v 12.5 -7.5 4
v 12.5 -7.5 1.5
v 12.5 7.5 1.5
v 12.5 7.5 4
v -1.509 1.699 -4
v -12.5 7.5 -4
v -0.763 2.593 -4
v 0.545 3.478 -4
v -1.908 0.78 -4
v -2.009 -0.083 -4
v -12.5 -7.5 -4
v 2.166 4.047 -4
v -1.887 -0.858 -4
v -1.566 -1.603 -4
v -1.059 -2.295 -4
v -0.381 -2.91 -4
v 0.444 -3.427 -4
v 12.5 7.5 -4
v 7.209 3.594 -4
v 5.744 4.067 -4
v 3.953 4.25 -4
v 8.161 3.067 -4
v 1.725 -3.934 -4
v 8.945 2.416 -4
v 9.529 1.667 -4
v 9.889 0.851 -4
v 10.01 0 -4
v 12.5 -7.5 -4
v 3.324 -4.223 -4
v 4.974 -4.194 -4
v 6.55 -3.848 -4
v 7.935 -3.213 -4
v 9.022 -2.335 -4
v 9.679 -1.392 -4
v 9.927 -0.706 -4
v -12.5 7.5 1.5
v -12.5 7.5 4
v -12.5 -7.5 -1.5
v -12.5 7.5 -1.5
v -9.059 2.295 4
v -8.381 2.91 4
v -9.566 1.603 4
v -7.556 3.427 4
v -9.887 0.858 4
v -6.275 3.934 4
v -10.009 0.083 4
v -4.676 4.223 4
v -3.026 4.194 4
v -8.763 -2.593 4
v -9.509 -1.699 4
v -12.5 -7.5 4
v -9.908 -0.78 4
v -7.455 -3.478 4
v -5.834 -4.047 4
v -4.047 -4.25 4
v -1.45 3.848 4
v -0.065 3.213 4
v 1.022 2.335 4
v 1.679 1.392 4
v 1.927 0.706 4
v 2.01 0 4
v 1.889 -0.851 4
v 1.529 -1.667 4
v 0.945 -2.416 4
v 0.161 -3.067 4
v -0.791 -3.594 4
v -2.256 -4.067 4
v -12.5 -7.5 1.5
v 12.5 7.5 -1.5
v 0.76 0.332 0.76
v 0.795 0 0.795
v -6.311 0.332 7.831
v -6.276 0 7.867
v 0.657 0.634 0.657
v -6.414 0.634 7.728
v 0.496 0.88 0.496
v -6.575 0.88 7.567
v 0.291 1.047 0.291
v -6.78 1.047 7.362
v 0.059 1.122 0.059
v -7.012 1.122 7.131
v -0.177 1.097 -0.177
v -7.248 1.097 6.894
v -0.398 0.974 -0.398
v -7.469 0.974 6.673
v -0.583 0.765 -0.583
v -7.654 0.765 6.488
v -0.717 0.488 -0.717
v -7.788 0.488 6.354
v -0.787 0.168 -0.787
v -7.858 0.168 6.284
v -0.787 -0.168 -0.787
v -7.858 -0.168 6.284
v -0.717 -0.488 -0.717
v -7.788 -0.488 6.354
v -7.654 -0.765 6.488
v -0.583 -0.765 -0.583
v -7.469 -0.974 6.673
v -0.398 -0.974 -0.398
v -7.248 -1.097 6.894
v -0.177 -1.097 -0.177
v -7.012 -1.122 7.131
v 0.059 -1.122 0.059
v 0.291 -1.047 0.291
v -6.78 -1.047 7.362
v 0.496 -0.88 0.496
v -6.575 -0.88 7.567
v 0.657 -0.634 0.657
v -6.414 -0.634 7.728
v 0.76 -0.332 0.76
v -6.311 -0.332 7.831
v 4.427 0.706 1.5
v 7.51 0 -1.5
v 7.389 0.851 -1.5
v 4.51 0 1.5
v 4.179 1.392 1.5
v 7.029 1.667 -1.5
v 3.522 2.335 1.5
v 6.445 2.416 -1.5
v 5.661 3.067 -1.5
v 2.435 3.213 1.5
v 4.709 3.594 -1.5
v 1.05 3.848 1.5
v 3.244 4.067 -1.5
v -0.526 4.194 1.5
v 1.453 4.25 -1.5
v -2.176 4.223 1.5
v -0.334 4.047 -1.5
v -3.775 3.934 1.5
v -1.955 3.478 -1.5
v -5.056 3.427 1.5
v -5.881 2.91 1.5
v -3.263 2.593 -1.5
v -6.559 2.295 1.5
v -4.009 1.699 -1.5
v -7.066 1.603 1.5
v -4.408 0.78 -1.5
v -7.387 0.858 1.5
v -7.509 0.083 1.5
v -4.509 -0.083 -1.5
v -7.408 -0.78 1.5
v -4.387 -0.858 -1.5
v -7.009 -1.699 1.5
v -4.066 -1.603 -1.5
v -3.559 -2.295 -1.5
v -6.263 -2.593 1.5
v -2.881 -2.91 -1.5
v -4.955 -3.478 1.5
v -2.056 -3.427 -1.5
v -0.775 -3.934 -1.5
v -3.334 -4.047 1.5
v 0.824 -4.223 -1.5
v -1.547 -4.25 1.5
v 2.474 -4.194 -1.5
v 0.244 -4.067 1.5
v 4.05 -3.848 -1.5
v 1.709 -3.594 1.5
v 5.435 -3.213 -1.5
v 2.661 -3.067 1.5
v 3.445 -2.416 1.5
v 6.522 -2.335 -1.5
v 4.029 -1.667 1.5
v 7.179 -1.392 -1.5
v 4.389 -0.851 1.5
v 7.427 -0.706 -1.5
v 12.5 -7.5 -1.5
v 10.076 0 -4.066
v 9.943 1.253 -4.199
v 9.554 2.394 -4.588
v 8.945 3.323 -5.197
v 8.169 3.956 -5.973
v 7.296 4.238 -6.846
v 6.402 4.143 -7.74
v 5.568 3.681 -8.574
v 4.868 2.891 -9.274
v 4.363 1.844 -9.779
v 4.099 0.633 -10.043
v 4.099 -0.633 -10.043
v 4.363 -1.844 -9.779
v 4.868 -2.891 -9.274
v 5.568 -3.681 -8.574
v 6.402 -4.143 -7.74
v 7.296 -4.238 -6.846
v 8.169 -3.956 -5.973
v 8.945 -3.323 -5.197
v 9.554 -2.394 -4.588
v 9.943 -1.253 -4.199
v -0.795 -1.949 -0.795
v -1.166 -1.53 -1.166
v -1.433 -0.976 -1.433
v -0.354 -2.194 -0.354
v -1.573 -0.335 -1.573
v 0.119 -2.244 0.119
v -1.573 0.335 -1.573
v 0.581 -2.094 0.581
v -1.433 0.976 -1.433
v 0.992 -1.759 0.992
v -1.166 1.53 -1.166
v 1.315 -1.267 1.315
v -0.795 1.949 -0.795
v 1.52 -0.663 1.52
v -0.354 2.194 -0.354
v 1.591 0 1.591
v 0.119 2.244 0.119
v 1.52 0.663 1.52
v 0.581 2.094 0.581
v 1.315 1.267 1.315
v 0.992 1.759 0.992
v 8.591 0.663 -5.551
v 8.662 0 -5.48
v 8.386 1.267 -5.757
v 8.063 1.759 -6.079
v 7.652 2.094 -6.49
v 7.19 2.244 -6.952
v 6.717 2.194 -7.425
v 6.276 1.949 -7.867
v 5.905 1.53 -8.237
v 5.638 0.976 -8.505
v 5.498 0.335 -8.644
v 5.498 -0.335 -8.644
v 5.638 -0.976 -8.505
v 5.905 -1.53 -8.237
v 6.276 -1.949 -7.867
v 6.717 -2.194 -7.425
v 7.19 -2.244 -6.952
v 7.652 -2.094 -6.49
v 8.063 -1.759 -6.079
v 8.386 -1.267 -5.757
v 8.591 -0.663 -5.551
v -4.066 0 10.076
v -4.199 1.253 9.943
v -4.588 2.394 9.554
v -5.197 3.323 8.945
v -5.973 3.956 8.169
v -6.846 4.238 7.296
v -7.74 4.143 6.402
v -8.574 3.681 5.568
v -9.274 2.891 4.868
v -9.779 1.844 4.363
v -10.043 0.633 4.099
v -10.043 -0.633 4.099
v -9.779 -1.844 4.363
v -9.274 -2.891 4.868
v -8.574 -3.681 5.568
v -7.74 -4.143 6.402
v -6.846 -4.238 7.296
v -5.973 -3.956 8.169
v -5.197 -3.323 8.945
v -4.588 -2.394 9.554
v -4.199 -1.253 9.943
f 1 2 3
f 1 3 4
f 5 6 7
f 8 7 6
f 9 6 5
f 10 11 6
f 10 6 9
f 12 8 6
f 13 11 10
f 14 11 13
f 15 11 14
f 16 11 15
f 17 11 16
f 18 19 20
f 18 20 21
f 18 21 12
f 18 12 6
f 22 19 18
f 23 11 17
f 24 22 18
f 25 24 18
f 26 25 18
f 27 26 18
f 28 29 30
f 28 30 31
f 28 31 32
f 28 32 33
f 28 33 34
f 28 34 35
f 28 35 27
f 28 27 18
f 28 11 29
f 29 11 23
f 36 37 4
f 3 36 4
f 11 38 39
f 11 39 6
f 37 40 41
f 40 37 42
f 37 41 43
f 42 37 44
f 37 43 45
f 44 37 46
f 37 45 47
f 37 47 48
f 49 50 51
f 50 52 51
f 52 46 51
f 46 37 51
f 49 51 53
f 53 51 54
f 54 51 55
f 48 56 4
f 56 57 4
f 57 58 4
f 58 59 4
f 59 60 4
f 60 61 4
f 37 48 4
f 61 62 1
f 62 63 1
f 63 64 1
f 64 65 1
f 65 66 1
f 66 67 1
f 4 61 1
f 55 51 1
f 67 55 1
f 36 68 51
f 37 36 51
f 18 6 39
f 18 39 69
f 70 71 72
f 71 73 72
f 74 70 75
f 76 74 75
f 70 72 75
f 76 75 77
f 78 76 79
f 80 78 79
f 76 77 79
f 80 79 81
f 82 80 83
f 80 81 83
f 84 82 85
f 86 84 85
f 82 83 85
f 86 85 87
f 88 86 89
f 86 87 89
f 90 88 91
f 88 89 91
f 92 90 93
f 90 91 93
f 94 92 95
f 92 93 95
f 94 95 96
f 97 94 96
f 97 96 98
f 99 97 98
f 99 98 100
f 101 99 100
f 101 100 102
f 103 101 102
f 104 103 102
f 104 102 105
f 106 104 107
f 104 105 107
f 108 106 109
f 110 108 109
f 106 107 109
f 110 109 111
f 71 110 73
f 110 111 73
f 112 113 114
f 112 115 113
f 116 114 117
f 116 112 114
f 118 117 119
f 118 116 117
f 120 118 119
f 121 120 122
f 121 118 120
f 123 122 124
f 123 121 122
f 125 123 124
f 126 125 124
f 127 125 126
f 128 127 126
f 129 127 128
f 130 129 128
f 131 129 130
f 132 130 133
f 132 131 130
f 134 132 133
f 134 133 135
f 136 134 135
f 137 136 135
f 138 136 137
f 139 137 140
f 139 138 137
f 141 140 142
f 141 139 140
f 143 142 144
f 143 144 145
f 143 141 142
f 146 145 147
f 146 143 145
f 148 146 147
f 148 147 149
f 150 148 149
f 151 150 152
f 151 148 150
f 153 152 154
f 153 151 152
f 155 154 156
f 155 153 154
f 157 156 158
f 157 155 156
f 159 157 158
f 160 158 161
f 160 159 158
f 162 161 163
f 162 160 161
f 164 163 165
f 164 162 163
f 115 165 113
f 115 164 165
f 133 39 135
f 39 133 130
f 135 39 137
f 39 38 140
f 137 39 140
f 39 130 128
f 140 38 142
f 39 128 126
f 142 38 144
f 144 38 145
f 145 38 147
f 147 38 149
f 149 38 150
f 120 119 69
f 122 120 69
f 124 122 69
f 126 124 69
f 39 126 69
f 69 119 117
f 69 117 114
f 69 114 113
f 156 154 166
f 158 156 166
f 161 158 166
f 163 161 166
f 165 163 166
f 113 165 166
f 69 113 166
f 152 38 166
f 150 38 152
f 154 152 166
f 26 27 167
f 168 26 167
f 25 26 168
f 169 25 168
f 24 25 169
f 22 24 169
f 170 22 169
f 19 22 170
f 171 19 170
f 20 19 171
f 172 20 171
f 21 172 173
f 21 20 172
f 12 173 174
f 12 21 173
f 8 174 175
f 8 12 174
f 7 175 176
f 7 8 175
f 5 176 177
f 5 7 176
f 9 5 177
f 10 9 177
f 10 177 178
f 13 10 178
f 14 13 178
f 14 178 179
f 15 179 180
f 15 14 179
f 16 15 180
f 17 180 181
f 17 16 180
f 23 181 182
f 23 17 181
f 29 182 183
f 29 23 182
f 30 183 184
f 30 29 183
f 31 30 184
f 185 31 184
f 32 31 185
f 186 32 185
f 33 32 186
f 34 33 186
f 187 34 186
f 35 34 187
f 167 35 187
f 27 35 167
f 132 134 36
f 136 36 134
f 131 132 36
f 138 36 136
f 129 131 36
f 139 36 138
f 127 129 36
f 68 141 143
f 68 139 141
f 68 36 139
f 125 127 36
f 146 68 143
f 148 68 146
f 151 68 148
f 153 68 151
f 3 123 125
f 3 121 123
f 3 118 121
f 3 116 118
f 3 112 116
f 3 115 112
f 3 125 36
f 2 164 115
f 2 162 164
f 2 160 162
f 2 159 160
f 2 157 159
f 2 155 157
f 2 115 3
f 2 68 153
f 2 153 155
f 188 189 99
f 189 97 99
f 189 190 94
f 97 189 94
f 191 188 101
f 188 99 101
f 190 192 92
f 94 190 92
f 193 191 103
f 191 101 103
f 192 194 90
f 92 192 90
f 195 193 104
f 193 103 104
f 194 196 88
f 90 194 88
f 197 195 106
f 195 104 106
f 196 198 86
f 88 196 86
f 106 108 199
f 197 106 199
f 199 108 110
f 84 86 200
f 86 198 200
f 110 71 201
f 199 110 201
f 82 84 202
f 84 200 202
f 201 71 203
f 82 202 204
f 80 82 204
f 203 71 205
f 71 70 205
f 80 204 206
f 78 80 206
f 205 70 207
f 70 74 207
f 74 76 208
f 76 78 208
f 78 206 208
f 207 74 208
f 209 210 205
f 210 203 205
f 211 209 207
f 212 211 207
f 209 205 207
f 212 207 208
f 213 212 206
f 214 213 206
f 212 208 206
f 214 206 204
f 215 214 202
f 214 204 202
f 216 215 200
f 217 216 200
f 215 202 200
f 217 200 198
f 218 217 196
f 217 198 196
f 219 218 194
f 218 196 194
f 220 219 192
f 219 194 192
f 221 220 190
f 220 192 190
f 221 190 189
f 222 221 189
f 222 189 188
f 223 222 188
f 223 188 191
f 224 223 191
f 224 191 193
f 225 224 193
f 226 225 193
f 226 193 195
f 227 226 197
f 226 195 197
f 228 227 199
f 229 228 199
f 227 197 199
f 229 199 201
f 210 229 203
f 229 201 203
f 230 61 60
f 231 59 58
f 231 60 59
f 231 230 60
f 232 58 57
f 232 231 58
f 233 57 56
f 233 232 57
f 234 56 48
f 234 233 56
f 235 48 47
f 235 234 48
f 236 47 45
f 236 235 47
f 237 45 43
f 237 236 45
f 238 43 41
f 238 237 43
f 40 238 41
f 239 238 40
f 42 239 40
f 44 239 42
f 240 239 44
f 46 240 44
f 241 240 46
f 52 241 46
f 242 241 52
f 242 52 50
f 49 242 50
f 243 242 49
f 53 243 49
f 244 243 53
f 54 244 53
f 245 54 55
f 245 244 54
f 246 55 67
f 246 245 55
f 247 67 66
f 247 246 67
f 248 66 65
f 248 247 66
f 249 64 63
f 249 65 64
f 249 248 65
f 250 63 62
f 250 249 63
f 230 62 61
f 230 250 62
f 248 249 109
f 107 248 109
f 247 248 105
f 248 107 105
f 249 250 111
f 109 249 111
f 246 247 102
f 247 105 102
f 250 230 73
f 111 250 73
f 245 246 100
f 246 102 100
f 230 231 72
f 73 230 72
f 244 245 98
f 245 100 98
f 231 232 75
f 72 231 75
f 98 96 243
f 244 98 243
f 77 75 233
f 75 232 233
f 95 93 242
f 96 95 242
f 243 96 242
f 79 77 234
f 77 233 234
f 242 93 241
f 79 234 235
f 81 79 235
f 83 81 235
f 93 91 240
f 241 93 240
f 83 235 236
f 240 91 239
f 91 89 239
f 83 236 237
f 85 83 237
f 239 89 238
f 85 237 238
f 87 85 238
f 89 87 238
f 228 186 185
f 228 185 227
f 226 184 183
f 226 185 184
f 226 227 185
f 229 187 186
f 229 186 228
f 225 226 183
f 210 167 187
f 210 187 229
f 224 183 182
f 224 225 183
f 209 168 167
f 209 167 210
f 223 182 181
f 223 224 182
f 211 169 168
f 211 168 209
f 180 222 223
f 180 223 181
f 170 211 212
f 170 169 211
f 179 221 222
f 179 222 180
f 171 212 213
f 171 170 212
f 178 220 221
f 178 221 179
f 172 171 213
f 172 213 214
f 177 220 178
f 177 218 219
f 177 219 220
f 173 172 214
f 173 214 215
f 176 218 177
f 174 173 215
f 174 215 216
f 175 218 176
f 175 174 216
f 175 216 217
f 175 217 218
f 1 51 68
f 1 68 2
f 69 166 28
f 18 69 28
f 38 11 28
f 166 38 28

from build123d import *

# Parameters (mm, degrees)
SKETCH001_W = 4.25
SKETCH001_H = 20
SKETCH002_W = 25
SKETCH002_H = 2.5
PAD_DEPTH   = 7.5


with BuildPart() as part:
    # Sketch001 → Revolution (revolve)
    with BuildSketch(Plane(origin=(0, 0, 0), x_dir=(0.707107, 0, 0.707107), z_dir=(0, -1, 0))):
        with Locations((2.125, 0)):
            Rectangle(SKETCH001_W, SKETCH001_H)
    revolve(axis=Axis((0, 0, 0), (-0.707107, 0, 0.707107)))

    # Sketch002 → Pad (new body, symmetric)
    with BuildSketch(Plane.XZ):
        with Locations((0, 2.75)):
            Rectangle(SKETCH002_W, SKETCH002_H)
    pad = extrude(amount=PAD_DEPTH, both=True)

    # Mirrored: Pad across Sketch002 H_Axis
    add(pad.mirror(Plane(origin=(0, 0, 0), x_dir=(0, -1, 0), z_dir=(0, 0, 1))))

    # Sketch → Groove (revolve, cut)
    with BuildSketch(Plane(origin=(0, 0, 0), x_dir=(0.707107, 0, 0.707107), z_dir=(0, -1, 0))):
        Polygon((0, -10), (2.25, -10), (2.25, 0), (1.125, 0), (1.125, 10), (0, 10), align=None)
    revolve(axis=Axis((0, 0, 0), (-0.707107, 0, 0.707107)), mode=Mode.SUBTRACT)


solid = part.part
